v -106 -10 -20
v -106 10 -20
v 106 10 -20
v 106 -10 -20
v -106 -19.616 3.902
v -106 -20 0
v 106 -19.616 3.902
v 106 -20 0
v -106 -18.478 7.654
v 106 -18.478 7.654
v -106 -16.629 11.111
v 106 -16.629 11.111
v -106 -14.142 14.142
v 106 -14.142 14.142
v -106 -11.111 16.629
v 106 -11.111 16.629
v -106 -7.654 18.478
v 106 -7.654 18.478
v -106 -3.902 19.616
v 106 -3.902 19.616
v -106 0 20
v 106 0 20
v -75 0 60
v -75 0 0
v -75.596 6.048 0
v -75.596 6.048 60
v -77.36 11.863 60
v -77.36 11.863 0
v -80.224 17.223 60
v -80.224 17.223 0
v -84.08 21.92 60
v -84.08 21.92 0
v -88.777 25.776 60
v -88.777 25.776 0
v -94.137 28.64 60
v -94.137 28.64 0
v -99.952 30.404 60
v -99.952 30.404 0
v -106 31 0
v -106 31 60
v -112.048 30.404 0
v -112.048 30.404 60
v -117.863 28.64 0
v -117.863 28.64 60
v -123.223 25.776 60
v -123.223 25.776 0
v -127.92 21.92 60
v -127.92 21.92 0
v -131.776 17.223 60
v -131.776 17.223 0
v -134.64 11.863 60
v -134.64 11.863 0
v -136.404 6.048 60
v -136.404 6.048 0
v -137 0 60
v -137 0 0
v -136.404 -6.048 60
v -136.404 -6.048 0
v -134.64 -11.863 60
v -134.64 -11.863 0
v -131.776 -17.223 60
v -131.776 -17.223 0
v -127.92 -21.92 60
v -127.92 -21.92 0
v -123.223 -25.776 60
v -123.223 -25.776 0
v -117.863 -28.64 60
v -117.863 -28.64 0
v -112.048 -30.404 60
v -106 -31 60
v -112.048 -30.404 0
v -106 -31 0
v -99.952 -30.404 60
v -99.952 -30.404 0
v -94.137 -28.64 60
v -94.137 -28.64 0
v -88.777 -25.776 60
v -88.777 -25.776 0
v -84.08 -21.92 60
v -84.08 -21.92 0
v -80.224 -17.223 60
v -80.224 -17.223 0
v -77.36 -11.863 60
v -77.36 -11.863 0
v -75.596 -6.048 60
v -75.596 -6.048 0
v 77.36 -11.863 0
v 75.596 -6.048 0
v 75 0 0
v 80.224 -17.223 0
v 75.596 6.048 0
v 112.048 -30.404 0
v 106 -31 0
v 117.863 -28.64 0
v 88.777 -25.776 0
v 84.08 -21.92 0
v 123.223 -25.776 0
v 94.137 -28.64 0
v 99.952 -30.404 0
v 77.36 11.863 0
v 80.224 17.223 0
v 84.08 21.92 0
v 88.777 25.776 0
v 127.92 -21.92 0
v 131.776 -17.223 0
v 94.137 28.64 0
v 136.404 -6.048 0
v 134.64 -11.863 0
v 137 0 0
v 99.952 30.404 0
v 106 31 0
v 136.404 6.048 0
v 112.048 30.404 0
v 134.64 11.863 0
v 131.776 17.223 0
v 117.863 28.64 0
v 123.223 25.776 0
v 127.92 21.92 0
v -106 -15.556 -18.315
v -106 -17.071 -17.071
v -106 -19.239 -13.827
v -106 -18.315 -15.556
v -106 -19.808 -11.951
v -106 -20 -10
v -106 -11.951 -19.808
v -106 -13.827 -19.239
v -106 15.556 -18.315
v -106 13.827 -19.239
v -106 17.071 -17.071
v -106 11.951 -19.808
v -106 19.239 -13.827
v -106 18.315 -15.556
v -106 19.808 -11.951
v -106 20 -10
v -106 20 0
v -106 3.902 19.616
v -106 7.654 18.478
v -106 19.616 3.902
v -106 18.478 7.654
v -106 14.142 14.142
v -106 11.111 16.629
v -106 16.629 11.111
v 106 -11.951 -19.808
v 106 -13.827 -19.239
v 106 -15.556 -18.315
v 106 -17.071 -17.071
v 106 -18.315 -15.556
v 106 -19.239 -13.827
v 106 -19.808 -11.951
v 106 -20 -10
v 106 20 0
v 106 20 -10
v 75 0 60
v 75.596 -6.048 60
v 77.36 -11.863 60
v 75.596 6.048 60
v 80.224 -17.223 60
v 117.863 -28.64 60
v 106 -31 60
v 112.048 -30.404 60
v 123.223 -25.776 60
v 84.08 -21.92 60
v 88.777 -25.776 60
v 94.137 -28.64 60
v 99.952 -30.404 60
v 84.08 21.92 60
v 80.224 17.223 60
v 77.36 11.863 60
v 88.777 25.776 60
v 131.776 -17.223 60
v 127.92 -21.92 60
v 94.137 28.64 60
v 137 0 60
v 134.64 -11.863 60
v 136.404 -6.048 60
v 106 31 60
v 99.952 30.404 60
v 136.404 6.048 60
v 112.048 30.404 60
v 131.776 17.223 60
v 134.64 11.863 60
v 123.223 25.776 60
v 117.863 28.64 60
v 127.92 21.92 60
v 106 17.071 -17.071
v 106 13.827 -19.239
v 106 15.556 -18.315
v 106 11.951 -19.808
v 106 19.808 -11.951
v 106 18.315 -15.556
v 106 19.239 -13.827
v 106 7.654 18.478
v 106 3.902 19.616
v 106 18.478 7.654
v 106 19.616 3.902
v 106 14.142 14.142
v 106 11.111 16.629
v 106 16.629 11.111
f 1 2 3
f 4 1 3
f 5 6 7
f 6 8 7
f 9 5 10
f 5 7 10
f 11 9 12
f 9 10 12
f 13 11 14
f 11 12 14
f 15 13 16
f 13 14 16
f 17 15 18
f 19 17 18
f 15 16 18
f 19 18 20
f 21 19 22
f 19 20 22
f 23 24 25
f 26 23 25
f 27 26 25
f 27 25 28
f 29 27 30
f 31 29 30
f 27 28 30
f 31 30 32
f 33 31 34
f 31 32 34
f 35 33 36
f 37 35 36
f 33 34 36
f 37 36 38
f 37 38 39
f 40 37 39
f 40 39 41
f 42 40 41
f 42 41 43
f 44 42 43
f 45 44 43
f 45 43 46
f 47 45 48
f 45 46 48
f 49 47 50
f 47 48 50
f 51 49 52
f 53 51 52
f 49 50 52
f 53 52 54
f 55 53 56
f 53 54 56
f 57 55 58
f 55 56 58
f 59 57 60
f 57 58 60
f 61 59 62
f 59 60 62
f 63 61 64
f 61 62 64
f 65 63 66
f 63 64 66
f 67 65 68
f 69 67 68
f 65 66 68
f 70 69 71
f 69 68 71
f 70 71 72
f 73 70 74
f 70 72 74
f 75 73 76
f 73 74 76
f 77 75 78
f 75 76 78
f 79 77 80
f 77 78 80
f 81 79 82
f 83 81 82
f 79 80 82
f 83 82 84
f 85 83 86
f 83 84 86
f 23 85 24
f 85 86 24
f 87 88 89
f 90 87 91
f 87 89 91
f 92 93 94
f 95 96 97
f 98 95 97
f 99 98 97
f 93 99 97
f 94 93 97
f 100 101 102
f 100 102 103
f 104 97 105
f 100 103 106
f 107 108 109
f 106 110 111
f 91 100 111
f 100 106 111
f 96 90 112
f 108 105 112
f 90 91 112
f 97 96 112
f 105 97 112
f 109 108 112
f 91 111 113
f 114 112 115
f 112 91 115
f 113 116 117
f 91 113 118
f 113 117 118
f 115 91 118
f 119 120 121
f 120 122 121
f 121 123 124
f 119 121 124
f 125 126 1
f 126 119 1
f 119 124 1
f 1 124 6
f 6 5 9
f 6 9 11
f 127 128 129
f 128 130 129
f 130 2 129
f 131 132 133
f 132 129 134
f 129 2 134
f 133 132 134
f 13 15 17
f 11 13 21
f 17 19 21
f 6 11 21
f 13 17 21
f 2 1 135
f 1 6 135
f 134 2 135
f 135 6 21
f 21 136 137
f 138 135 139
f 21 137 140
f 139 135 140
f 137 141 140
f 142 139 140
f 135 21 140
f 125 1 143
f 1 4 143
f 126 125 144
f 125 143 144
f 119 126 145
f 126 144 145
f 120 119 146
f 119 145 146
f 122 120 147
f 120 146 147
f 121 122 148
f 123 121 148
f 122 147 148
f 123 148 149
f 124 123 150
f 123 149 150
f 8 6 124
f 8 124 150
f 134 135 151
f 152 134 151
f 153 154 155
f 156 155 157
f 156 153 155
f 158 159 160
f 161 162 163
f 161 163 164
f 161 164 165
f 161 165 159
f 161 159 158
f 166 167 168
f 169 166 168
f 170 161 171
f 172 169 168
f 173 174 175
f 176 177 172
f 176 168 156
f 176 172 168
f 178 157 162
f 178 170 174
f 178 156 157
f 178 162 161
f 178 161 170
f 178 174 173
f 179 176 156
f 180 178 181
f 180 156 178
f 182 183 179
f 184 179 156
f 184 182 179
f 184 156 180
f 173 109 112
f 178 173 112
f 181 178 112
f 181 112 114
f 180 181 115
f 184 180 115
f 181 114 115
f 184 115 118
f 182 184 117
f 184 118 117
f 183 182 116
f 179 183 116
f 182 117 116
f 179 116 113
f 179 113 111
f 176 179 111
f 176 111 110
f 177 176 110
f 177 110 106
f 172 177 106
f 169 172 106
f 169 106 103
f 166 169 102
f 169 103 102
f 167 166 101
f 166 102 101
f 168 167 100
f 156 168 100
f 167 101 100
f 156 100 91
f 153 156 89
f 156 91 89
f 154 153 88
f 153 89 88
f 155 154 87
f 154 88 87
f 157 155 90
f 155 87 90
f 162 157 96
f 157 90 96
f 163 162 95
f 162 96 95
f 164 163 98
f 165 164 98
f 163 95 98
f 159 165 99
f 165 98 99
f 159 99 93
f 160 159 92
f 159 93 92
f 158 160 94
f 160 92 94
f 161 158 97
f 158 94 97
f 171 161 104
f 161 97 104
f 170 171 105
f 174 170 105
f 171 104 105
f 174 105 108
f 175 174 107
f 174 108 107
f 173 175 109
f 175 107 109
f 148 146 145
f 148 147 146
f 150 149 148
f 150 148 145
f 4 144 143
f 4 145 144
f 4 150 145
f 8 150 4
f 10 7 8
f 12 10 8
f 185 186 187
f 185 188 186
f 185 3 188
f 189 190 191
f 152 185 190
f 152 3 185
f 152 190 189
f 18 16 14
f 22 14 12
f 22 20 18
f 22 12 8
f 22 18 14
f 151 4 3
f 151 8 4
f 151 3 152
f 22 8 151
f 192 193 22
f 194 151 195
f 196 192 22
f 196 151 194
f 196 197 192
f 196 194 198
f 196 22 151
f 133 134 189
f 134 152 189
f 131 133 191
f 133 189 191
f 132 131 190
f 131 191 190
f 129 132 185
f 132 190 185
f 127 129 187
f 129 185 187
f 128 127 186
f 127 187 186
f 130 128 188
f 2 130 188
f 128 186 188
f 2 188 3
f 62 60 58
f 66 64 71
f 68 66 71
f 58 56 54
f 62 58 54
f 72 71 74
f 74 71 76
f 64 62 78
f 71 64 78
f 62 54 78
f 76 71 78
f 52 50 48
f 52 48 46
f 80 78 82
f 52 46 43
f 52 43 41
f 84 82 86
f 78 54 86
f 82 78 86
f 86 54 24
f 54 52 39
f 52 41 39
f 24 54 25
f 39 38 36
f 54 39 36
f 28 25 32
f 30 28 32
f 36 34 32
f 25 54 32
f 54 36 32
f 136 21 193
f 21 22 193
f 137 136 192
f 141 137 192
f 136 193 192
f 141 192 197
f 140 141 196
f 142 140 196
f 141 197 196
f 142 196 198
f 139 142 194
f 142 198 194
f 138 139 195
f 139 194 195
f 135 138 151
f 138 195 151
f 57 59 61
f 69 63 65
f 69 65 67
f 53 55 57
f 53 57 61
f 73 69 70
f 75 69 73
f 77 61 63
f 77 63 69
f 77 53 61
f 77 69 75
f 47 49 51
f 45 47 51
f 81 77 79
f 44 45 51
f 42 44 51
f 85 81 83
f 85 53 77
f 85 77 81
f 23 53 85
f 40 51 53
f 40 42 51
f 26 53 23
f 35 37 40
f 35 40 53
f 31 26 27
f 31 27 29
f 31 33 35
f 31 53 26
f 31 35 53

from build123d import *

# Parameters (mm, degrees)
F0_R     = 31
F1_DEPTH = 60
F2_W     = 212
F2_H     = 40
F3_DEPTH = 20
F4_R     = 10
F5_R     = 19.99999


# Not quite as in the source:
# - a fillet or chamfer is up to 0.001 mm smaller than in the source, because OpenCascade refuses the exact size


with BuildPart() as f1:
    # F0 (on Top) → F1 (new body)
    with BuildSketch(Plane.XY):
        with Locations((-106, 0)):
            Circle(F0_R)
    extrude(amount=F1_DEPTH)


with BuildPart() as f1b:
    # F0 (on Top) → F1, piece 2 (new body)
    with BuildSketch(Plane.XY):
        with Locations((106, 0)):
            Circle(F0_R)
    extrude(amount=F1_DEPTH)


with BuildPart() as f3:
    # F2 (on Top) → F3 (new body, symmetric)
    with BuildSketch(Plane.XY):
        Rectangle(F2_W, F2_H)
    extrude(amount=F3_DEPTH, both=True)

    # F4
    f4_edges = [f3.edges().sort_by_distance(p)[0] for p in [
        (0, 20, -20),
        (0, -20, -20),
    ]]
    fillet(f4_edges, radius=F4_R)

    # F5 (radius 20 in the source; OpenCascade refuses exactly that, so slightly less here)
    f5_edges = [f3.edges().sort_by_distance(p)[0] for p in [
        (0, 20, 20),
        (0, -20, 20),
    ]]
    fillet(f5_edges, radius=F5_R)


solid = Compound([f1.part, f1b.part, f3.part])
